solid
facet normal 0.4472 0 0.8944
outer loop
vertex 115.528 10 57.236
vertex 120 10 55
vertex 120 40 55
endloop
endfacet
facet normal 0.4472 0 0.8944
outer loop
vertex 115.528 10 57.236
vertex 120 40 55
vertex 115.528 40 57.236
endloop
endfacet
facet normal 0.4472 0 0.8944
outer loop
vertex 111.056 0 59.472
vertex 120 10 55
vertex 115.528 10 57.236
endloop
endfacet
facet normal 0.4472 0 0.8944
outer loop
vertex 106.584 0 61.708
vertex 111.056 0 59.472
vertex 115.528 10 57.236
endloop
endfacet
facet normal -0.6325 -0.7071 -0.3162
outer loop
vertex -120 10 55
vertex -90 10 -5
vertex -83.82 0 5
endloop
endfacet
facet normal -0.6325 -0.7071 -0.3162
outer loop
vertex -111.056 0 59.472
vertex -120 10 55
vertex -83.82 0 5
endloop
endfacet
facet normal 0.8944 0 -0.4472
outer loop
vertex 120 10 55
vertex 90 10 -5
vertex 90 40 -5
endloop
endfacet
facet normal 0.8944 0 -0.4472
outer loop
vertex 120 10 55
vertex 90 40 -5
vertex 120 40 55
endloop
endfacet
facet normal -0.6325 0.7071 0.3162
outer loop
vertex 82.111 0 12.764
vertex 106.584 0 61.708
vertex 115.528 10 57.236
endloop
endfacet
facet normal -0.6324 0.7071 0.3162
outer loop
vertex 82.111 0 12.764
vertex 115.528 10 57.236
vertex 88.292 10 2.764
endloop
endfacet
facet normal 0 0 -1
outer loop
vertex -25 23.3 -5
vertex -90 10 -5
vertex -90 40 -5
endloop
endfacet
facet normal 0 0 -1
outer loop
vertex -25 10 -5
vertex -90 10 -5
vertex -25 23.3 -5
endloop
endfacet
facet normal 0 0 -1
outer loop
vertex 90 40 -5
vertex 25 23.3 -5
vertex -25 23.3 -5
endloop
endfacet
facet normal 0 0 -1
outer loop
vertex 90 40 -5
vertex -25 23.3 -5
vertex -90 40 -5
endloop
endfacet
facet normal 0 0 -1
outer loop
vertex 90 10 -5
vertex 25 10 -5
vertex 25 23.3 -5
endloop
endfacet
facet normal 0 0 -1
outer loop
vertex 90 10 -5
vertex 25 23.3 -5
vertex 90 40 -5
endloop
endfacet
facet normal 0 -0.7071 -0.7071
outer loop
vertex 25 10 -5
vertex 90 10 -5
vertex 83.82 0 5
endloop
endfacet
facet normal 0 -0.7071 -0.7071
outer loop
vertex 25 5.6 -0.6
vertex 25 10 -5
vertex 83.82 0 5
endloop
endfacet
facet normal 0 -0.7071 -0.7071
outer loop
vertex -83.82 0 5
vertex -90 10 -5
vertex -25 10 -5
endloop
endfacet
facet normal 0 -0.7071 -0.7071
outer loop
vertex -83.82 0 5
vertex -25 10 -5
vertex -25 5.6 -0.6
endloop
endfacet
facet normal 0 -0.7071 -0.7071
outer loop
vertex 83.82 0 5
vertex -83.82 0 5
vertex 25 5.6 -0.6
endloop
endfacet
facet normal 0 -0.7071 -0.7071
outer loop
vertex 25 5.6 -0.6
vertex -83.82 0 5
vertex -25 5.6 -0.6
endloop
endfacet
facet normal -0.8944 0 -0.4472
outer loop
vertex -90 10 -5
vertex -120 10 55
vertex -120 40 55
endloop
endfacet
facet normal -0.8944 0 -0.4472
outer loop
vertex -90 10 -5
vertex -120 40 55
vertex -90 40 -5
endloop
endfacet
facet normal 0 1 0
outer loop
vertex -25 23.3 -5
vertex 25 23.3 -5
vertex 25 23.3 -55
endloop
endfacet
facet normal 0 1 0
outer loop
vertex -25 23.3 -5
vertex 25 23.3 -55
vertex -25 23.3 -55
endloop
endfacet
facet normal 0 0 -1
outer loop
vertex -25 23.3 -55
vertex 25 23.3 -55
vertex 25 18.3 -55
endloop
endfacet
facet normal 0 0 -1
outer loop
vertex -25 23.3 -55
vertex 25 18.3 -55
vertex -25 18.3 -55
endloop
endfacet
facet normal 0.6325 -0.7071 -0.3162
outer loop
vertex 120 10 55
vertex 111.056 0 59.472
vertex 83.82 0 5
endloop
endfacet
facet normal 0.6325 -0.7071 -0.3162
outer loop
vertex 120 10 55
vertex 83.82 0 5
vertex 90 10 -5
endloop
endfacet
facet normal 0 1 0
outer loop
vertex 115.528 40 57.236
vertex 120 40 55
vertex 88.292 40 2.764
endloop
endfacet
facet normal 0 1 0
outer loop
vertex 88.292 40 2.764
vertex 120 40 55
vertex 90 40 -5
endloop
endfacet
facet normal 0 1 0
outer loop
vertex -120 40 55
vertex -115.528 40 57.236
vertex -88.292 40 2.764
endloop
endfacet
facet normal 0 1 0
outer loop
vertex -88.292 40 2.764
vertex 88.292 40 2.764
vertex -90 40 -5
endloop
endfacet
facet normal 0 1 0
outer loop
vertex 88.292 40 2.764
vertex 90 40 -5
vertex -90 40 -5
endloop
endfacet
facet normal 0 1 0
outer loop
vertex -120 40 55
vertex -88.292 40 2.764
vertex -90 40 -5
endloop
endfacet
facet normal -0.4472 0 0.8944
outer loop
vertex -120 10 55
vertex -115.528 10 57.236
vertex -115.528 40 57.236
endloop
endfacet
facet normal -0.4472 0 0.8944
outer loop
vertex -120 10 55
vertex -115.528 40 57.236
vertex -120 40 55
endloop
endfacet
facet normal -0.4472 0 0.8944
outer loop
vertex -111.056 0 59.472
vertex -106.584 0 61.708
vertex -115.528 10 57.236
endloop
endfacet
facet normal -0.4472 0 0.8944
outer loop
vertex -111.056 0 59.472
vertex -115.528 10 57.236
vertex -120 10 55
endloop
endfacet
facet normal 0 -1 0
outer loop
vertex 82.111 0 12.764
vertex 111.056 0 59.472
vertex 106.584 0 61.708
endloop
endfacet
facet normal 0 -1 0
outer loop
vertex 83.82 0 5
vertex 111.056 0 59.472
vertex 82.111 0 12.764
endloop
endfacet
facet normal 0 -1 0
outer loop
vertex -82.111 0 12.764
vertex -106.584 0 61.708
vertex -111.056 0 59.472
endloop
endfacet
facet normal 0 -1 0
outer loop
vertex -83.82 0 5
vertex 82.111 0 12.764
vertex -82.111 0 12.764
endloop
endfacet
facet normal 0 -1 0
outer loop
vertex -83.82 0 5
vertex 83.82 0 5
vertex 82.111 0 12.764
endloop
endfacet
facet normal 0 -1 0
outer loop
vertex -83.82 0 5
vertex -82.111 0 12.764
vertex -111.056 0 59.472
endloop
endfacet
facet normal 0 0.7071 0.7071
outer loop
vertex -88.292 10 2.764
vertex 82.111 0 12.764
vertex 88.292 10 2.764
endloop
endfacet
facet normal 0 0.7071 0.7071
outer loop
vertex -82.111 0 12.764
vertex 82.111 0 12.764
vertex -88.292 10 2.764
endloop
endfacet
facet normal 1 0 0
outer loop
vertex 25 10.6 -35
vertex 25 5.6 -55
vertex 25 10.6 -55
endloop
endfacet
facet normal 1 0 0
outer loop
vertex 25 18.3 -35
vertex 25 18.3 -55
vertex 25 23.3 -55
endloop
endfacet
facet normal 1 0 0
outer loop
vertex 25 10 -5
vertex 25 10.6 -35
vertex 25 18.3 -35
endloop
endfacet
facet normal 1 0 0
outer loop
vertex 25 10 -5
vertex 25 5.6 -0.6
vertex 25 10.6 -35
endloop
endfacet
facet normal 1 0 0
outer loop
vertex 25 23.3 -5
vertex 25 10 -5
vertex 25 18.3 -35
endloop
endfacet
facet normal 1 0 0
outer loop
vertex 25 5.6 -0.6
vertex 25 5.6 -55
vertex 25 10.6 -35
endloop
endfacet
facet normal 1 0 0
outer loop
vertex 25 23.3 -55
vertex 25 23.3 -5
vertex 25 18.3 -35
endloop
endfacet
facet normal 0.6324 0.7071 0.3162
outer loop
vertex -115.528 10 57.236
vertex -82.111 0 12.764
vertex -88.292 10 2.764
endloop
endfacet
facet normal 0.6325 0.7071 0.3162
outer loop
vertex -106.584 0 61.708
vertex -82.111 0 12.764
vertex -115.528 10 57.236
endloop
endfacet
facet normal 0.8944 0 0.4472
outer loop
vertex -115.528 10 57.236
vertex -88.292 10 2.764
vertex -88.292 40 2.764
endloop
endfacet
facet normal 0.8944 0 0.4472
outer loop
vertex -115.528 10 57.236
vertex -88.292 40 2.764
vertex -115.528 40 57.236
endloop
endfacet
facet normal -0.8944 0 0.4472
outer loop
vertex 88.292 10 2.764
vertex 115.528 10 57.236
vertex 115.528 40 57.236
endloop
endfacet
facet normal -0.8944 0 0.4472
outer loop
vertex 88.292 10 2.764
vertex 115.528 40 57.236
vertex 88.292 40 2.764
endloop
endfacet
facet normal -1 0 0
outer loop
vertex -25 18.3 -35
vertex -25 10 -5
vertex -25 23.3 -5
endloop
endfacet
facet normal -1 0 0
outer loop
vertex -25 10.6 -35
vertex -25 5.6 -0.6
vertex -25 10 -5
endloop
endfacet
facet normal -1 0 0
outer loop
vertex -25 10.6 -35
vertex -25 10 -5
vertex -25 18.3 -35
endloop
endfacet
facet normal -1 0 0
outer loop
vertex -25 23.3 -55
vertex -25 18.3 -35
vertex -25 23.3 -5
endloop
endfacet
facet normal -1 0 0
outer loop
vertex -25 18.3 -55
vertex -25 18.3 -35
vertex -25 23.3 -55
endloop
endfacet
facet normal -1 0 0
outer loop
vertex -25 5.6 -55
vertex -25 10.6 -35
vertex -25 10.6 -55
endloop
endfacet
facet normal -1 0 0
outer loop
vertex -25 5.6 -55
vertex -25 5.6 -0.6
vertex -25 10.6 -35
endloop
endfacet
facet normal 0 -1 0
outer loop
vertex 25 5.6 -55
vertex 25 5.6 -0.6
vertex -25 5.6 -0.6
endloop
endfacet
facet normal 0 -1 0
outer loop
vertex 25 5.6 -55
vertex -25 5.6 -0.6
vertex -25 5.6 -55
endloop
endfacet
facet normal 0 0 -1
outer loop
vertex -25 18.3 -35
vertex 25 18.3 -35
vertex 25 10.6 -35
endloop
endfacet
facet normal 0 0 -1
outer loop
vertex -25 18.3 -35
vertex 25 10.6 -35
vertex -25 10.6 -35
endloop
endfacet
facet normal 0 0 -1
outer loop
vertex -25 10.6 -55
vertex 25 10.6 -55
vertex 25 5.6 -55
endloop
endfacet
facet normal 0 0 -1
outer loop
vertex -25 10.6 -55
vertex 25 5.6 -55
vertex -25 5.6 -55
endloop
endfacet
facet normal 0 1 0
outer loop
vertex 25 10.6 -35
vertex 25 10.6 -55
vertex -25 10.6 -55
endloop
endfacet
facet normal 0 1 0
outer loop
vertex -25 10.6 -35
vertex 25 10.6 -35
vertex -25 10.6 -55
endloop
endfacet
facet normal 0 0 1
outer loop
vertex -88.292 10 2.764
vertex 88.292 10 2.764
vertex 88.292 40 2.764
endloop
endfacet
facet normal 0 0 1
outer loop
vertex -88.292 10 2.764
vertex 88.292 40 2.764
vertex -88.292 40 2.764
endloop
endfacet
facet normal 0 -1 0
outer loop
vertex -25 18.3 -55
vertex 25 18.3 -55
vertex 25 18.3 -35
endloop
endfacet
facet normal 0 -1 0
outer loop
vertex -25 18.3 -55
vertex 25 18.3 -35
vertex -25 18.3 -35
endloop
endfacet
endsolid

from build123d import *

# Parameters (mm, degrees)
BOSS_EXTRUDE1_DEPTH = 10
DRAFT1_ANGLE        = 45
BOSS_EXTRUDE2_DEPTH = 30
SKETCH6_W           = 50
SKETCH6_H           = 17.7
BOSS_EXTRUDE3_DEPTH = 50
SKETCH7_W           = 50
SKETCH7_H           = 7.7
CUT_EXTRUDE4_DEPTH  = 20
CHAMFER1_SIZE       = 10


with BuildPart() as part:
    # Sketch2 → Boss-Extrude1 (new body)
    with BuildSketch(Plane(origin=(0, 0, 0), x_dir=(1, 0, 0), z_dir=(0, 1, 0))):
        Polygon((-90, 5), (90, 5), (120, -55), (115.527864045, -57.236067977), (88.291796068, -2.763932023), (-88.291796068, -2.763932023), (-115.527864045, -57.236067977), (-120, -55), align=None)
    extrude(amount=BOSS_EXTRUDE1_DEPTH)

    # Draft1
    draft1_faces = [part.faces().sort_by_distance(p)[0] for p in [
        (101.909830056, 5, 30),
        (0, 5, 2.763932023),
        (-101.909830056, 5, 30),
    ]]
    draft(draft1_faces, Plane.ZX.offset(10), DRAFT1_ANGLE)

    # Sketch5 → Boss-Extrude2 (add)
    with BuildSketch(Plane(origin=(0, 10, 0), x_dir=(1, 0, 0), z_dir=(0, 1, 0))):
        Polygon((-120, -55), (-90, 5), (90, 5), (120, -55), (115.527864045, -57.236067977), (88.291796068, -2.763932023), (-88.291796068, -2.763932023), (-115.527864045, -57.236067977), align=None)
    extrude(amount=BOSS_EXTRUDE2_DEPTH)

    # Sketch6 → Boss-Extrude3 (add)
    with BuildSketch(Plane(origin=(0, 0, -5), x_dir=(-1, 0, 0), z_dir=(0, 0, -1))):
        with Locations((0, 14.45)):
            Rectangle(SKETCH6_W, SKETCH6_H)
    extrude(amount=BOSS_EXTRUDE3_DEPTH)

    # Sketch7 → Cut-Extrude4 (cut)
    with BuildSketch(Plane(origin=(0, 0, -55), x_dir=(-1, 0, 0), z_dir=(0, 0, -1))):
        with Locations((0, 14.45)):
            Rectangle(SKETCH7_W, SKETCH7_H)
    extrude(amount=-CUT_EXTRUDE4_DEPTH, mode=Mode.SUBTRACT)

    # Chamfer1
    # the kernel refuses this chamfer: 10 mm, written as the material it takes off along each edge
    with BuildSketch(Plane(origin=(78.499084045, 0, -28.001831911), x_dir=(-0.8940890232049223, -0.027495876610586386, 0.44704451160246145), z_dir=(0.44721359549995815, 0, 0.8944271909999159))) as chamfer1_piece_1:
        Polygon((CHAMFER1_SIZE * 0.999621916911, -CHAMFER1_SIZE * 0.0274958766106), (-CHAMFER1_SIZE * 0.0274958766106, -CHAMFER1_SIZE * 0.999621916911), (0, 0), align=None)
    extrude(amount=118.515699084, mode=Mode.SUBTRACT)
    with BuildSketch(Plane(origin=(-115.71682988, 0, -5), x_dir=(0, 0.9996219169112968, -0.027495876610586403), z_dir=(1, 0, 0))) as chamfer1_piece_2_section:
        Polygon((CHAMFER1_SIZE * 0.999621916911, CHAMFER1_SIZE * 0.0274958766106), (-CHAMFER1_SIZE * 0.0274958766106, CHAMFER1_SIZE * 0.999621916911), (0, 0), align=None)
    chamfer1_piece_2 = extrude(amount=231.433659759, mode=Mode.PRIVATE)
    chamfer1_piece_2 = split(chamfer1_piece_2, bisect_by=Plane(origin=(-70.35841494, 5.6, -3.753576162), z_dir=(0, 1, 0)), keep=Keep.TOP, mode=Mode.PRIVATE)
    chamfer1_piece_2 = split(chamfer1_piece_2, bisect_by=Plane(origin=(-25, 7.219915687, -3.753576162), z_dir=(-1, 0, 0)), keep=Keep.TOP, mode=Mode.PRIVATE)
    add(chamfer1_piece_2, mode=Mode.SUBTRACT)
    with BuildSketch(Plane(origin=(-115.71682988, 0, -5), x_dir=(0, 0.9996219169112968, -0.027495876610586403), z_dir=(1, 0, 0))) as chamfer1_piece_3_section:
        Polygon((CHAMFER1_SIZE * 0.999621916911, CHAMFER1_SIZE * 0.0274958766106), (-CHAMFER1_SIZE * 0.0274958766106, CHAMFER1_SIZE * 0.999621916911), (0, 0), align=None)
    chamfer1_piece_3 = extrude(amount=231.433659759, mode=Mode.PRIVATE)
    chamfer1_piece_3 = split(chamfer1_piece_3, bisect_by=Plane(origin=(-70.35841494, 5.6, -1.178972158), z_dir=(0, -1, 0)), keep=Keep.TOP, mode=Mode.PRIVATE)
    chamfer1_piece_3 = split(chamfer1_piece_3, bisect_by=Plane(origin=(-25, 2.297915816, -1.178972158), z_dir=(-1, 0, 0)), keep=Keep.TOP, mode=Mode.PRIVATE)
    add(chamfer1_piece_3, mode=Mode.SUBTRACT)
    with BuildSketch(Plane(origin=(-115.71682988, 0, -5), x_dir=(0, 0.9996219169112968, -0.027495876610586403), z_dir=(1, 0, 0))) as chamfer1_piece_4_section:
        Polygon((CHAMFER1_SIZE * 0.999621916911, CHAMFER1_SIZE * 0.0274958766106), (-CHAMFER1_SIZE * 0.0274958766106, CHAMFER1_SIZE * 0.999621916911), (0, 0), align=None)
    chamfer1_piece_4 = extrude(amount=231.433659759, mode=Mode.PRIVATE)
    chamfer1_piece_4 = split(chamfer1_piece_4, bisect_by=Plane(origin=(0, 5.6, -1.178972158), z_dir=(0, -1, 0)), keep=Keep.TOP, mode=Mode.PRIVATE)
    chamfer1_piece_4 = split(chamfer1_piece_4, bisect_by=Plane(origin=(-25, 2.297915816, -1.178972158), z_dir=(1, 0, 0)), keep=Keep.TOP, mode=Mode.PRIVATE)
    chamfer1_piece_4 = split(chamfer1_piece_4, bisect_by=Plane(origin=(25, 2.297915816, -1.178972158), z_dir=(-1, 0, 0)), keep=Keep.TOP, mode=Mode.PRIVATE)
    add(chamfer1_piece_4, mode=Mode.SUBTRACT)
    with BuildSketch(Plane(origin=(-115.71682988, 0, -5), x_dir=(0, 0.9996219169112968, -0.027495876610586403), z_dir=(1, 0, 0))) as chamfer1_piece_5_section:
        Polygon((CHAMFER1_SIZE * 0.999621916911, CHAMFER1_SIZE * 0.0274958766106), (-CHAMFER1_SIZE * 0.0274958766106, CHAMFER1_SIZE * 0.999621916911), (0, 0), align=None)
    chamfer1_piece_5 = extrude(amount=231.433659759, mode=Mode.PRIVATE)
    chamfer1_piece_5 = split(chamfer1_piece_5, bisect_by=Plane(origin=(70.35841494, 5.6, -3.753576162), z_dir=(0, 1, 0)), keep=Keep.TOP, mode=Mode.PRIVATE)
    chamfer1_piece_5 = split(chamfer1_piece_5, bisect_by=Plane(origin=(25, 7.219915687, -3.753576162), z_dir=(1, 0, 0)), keep=Keep.TOP, mode=Mode.PRIVATE)
    add(chamfer1_piece_5, mode=Mode.SUBTRACT)
    with BuildSketch(Plane(origin=(-115.71682988, 0, -5), x_dir=(0, 0.9996219169112968, -0.027495876610586403), z_dir=(1, 0, 0))) as chamfer1_piece_6_section:
        Polygon((CHAMFER1_SIZE * 0.999621916911, CHAMFER1_SIZE * 0.0274958766106), (-CHAMFER1_SIZE * 0.0274958766106, CHAMFER1_SIZE * 0.999621916911), (0, 0), align=None)
    chamfer1_piece_6 = extrude(amount=231.433659759, mode=Mode.PRIVATE)
    chamfer1_piece_6 = split(chamfer1_piece_6, bisect_by=Plane(origin=(70.35841494, 5.6, -1.178972158), z_dir=(0, -1, 0)), keep=Keep.TOP, mode=Mode.PRIVATE)
    chamfer1_piece_6 = split(chamfer1_piece_6, bisect_by=Plane(origin=(25, 2.297915816, -1.178972158), z_dir=(1, 0, 0)), keep=Keep.TOP, mode=Mode.PRIVATE)
    add(chamfer1_piece_6, mode=Mode.SUBTRACT)
    with BuildSketch(Plane(origin=(-131.500915955, 0, 78.001831911), x_dir=(-0.02459305968088589, 0.9996219169112968, -0.012296529840442941), z_dir=(0.447213595499958, 0, -0.894427190999916))) as chamfer1_piece_7:
        Polygon((CHAMFER1_SIZE * 0.999621916911, CHAMFER1_SIZE * 0.0274958766106), (-CHAMFER1_SIZE * 0.0274958766106, CHAMFER1_SIZE * 0.999621916911), (0, 0), align=None)
    extrude(amount=118.515699084, mode=Mode.SUBTRACT)


solid = part.part
